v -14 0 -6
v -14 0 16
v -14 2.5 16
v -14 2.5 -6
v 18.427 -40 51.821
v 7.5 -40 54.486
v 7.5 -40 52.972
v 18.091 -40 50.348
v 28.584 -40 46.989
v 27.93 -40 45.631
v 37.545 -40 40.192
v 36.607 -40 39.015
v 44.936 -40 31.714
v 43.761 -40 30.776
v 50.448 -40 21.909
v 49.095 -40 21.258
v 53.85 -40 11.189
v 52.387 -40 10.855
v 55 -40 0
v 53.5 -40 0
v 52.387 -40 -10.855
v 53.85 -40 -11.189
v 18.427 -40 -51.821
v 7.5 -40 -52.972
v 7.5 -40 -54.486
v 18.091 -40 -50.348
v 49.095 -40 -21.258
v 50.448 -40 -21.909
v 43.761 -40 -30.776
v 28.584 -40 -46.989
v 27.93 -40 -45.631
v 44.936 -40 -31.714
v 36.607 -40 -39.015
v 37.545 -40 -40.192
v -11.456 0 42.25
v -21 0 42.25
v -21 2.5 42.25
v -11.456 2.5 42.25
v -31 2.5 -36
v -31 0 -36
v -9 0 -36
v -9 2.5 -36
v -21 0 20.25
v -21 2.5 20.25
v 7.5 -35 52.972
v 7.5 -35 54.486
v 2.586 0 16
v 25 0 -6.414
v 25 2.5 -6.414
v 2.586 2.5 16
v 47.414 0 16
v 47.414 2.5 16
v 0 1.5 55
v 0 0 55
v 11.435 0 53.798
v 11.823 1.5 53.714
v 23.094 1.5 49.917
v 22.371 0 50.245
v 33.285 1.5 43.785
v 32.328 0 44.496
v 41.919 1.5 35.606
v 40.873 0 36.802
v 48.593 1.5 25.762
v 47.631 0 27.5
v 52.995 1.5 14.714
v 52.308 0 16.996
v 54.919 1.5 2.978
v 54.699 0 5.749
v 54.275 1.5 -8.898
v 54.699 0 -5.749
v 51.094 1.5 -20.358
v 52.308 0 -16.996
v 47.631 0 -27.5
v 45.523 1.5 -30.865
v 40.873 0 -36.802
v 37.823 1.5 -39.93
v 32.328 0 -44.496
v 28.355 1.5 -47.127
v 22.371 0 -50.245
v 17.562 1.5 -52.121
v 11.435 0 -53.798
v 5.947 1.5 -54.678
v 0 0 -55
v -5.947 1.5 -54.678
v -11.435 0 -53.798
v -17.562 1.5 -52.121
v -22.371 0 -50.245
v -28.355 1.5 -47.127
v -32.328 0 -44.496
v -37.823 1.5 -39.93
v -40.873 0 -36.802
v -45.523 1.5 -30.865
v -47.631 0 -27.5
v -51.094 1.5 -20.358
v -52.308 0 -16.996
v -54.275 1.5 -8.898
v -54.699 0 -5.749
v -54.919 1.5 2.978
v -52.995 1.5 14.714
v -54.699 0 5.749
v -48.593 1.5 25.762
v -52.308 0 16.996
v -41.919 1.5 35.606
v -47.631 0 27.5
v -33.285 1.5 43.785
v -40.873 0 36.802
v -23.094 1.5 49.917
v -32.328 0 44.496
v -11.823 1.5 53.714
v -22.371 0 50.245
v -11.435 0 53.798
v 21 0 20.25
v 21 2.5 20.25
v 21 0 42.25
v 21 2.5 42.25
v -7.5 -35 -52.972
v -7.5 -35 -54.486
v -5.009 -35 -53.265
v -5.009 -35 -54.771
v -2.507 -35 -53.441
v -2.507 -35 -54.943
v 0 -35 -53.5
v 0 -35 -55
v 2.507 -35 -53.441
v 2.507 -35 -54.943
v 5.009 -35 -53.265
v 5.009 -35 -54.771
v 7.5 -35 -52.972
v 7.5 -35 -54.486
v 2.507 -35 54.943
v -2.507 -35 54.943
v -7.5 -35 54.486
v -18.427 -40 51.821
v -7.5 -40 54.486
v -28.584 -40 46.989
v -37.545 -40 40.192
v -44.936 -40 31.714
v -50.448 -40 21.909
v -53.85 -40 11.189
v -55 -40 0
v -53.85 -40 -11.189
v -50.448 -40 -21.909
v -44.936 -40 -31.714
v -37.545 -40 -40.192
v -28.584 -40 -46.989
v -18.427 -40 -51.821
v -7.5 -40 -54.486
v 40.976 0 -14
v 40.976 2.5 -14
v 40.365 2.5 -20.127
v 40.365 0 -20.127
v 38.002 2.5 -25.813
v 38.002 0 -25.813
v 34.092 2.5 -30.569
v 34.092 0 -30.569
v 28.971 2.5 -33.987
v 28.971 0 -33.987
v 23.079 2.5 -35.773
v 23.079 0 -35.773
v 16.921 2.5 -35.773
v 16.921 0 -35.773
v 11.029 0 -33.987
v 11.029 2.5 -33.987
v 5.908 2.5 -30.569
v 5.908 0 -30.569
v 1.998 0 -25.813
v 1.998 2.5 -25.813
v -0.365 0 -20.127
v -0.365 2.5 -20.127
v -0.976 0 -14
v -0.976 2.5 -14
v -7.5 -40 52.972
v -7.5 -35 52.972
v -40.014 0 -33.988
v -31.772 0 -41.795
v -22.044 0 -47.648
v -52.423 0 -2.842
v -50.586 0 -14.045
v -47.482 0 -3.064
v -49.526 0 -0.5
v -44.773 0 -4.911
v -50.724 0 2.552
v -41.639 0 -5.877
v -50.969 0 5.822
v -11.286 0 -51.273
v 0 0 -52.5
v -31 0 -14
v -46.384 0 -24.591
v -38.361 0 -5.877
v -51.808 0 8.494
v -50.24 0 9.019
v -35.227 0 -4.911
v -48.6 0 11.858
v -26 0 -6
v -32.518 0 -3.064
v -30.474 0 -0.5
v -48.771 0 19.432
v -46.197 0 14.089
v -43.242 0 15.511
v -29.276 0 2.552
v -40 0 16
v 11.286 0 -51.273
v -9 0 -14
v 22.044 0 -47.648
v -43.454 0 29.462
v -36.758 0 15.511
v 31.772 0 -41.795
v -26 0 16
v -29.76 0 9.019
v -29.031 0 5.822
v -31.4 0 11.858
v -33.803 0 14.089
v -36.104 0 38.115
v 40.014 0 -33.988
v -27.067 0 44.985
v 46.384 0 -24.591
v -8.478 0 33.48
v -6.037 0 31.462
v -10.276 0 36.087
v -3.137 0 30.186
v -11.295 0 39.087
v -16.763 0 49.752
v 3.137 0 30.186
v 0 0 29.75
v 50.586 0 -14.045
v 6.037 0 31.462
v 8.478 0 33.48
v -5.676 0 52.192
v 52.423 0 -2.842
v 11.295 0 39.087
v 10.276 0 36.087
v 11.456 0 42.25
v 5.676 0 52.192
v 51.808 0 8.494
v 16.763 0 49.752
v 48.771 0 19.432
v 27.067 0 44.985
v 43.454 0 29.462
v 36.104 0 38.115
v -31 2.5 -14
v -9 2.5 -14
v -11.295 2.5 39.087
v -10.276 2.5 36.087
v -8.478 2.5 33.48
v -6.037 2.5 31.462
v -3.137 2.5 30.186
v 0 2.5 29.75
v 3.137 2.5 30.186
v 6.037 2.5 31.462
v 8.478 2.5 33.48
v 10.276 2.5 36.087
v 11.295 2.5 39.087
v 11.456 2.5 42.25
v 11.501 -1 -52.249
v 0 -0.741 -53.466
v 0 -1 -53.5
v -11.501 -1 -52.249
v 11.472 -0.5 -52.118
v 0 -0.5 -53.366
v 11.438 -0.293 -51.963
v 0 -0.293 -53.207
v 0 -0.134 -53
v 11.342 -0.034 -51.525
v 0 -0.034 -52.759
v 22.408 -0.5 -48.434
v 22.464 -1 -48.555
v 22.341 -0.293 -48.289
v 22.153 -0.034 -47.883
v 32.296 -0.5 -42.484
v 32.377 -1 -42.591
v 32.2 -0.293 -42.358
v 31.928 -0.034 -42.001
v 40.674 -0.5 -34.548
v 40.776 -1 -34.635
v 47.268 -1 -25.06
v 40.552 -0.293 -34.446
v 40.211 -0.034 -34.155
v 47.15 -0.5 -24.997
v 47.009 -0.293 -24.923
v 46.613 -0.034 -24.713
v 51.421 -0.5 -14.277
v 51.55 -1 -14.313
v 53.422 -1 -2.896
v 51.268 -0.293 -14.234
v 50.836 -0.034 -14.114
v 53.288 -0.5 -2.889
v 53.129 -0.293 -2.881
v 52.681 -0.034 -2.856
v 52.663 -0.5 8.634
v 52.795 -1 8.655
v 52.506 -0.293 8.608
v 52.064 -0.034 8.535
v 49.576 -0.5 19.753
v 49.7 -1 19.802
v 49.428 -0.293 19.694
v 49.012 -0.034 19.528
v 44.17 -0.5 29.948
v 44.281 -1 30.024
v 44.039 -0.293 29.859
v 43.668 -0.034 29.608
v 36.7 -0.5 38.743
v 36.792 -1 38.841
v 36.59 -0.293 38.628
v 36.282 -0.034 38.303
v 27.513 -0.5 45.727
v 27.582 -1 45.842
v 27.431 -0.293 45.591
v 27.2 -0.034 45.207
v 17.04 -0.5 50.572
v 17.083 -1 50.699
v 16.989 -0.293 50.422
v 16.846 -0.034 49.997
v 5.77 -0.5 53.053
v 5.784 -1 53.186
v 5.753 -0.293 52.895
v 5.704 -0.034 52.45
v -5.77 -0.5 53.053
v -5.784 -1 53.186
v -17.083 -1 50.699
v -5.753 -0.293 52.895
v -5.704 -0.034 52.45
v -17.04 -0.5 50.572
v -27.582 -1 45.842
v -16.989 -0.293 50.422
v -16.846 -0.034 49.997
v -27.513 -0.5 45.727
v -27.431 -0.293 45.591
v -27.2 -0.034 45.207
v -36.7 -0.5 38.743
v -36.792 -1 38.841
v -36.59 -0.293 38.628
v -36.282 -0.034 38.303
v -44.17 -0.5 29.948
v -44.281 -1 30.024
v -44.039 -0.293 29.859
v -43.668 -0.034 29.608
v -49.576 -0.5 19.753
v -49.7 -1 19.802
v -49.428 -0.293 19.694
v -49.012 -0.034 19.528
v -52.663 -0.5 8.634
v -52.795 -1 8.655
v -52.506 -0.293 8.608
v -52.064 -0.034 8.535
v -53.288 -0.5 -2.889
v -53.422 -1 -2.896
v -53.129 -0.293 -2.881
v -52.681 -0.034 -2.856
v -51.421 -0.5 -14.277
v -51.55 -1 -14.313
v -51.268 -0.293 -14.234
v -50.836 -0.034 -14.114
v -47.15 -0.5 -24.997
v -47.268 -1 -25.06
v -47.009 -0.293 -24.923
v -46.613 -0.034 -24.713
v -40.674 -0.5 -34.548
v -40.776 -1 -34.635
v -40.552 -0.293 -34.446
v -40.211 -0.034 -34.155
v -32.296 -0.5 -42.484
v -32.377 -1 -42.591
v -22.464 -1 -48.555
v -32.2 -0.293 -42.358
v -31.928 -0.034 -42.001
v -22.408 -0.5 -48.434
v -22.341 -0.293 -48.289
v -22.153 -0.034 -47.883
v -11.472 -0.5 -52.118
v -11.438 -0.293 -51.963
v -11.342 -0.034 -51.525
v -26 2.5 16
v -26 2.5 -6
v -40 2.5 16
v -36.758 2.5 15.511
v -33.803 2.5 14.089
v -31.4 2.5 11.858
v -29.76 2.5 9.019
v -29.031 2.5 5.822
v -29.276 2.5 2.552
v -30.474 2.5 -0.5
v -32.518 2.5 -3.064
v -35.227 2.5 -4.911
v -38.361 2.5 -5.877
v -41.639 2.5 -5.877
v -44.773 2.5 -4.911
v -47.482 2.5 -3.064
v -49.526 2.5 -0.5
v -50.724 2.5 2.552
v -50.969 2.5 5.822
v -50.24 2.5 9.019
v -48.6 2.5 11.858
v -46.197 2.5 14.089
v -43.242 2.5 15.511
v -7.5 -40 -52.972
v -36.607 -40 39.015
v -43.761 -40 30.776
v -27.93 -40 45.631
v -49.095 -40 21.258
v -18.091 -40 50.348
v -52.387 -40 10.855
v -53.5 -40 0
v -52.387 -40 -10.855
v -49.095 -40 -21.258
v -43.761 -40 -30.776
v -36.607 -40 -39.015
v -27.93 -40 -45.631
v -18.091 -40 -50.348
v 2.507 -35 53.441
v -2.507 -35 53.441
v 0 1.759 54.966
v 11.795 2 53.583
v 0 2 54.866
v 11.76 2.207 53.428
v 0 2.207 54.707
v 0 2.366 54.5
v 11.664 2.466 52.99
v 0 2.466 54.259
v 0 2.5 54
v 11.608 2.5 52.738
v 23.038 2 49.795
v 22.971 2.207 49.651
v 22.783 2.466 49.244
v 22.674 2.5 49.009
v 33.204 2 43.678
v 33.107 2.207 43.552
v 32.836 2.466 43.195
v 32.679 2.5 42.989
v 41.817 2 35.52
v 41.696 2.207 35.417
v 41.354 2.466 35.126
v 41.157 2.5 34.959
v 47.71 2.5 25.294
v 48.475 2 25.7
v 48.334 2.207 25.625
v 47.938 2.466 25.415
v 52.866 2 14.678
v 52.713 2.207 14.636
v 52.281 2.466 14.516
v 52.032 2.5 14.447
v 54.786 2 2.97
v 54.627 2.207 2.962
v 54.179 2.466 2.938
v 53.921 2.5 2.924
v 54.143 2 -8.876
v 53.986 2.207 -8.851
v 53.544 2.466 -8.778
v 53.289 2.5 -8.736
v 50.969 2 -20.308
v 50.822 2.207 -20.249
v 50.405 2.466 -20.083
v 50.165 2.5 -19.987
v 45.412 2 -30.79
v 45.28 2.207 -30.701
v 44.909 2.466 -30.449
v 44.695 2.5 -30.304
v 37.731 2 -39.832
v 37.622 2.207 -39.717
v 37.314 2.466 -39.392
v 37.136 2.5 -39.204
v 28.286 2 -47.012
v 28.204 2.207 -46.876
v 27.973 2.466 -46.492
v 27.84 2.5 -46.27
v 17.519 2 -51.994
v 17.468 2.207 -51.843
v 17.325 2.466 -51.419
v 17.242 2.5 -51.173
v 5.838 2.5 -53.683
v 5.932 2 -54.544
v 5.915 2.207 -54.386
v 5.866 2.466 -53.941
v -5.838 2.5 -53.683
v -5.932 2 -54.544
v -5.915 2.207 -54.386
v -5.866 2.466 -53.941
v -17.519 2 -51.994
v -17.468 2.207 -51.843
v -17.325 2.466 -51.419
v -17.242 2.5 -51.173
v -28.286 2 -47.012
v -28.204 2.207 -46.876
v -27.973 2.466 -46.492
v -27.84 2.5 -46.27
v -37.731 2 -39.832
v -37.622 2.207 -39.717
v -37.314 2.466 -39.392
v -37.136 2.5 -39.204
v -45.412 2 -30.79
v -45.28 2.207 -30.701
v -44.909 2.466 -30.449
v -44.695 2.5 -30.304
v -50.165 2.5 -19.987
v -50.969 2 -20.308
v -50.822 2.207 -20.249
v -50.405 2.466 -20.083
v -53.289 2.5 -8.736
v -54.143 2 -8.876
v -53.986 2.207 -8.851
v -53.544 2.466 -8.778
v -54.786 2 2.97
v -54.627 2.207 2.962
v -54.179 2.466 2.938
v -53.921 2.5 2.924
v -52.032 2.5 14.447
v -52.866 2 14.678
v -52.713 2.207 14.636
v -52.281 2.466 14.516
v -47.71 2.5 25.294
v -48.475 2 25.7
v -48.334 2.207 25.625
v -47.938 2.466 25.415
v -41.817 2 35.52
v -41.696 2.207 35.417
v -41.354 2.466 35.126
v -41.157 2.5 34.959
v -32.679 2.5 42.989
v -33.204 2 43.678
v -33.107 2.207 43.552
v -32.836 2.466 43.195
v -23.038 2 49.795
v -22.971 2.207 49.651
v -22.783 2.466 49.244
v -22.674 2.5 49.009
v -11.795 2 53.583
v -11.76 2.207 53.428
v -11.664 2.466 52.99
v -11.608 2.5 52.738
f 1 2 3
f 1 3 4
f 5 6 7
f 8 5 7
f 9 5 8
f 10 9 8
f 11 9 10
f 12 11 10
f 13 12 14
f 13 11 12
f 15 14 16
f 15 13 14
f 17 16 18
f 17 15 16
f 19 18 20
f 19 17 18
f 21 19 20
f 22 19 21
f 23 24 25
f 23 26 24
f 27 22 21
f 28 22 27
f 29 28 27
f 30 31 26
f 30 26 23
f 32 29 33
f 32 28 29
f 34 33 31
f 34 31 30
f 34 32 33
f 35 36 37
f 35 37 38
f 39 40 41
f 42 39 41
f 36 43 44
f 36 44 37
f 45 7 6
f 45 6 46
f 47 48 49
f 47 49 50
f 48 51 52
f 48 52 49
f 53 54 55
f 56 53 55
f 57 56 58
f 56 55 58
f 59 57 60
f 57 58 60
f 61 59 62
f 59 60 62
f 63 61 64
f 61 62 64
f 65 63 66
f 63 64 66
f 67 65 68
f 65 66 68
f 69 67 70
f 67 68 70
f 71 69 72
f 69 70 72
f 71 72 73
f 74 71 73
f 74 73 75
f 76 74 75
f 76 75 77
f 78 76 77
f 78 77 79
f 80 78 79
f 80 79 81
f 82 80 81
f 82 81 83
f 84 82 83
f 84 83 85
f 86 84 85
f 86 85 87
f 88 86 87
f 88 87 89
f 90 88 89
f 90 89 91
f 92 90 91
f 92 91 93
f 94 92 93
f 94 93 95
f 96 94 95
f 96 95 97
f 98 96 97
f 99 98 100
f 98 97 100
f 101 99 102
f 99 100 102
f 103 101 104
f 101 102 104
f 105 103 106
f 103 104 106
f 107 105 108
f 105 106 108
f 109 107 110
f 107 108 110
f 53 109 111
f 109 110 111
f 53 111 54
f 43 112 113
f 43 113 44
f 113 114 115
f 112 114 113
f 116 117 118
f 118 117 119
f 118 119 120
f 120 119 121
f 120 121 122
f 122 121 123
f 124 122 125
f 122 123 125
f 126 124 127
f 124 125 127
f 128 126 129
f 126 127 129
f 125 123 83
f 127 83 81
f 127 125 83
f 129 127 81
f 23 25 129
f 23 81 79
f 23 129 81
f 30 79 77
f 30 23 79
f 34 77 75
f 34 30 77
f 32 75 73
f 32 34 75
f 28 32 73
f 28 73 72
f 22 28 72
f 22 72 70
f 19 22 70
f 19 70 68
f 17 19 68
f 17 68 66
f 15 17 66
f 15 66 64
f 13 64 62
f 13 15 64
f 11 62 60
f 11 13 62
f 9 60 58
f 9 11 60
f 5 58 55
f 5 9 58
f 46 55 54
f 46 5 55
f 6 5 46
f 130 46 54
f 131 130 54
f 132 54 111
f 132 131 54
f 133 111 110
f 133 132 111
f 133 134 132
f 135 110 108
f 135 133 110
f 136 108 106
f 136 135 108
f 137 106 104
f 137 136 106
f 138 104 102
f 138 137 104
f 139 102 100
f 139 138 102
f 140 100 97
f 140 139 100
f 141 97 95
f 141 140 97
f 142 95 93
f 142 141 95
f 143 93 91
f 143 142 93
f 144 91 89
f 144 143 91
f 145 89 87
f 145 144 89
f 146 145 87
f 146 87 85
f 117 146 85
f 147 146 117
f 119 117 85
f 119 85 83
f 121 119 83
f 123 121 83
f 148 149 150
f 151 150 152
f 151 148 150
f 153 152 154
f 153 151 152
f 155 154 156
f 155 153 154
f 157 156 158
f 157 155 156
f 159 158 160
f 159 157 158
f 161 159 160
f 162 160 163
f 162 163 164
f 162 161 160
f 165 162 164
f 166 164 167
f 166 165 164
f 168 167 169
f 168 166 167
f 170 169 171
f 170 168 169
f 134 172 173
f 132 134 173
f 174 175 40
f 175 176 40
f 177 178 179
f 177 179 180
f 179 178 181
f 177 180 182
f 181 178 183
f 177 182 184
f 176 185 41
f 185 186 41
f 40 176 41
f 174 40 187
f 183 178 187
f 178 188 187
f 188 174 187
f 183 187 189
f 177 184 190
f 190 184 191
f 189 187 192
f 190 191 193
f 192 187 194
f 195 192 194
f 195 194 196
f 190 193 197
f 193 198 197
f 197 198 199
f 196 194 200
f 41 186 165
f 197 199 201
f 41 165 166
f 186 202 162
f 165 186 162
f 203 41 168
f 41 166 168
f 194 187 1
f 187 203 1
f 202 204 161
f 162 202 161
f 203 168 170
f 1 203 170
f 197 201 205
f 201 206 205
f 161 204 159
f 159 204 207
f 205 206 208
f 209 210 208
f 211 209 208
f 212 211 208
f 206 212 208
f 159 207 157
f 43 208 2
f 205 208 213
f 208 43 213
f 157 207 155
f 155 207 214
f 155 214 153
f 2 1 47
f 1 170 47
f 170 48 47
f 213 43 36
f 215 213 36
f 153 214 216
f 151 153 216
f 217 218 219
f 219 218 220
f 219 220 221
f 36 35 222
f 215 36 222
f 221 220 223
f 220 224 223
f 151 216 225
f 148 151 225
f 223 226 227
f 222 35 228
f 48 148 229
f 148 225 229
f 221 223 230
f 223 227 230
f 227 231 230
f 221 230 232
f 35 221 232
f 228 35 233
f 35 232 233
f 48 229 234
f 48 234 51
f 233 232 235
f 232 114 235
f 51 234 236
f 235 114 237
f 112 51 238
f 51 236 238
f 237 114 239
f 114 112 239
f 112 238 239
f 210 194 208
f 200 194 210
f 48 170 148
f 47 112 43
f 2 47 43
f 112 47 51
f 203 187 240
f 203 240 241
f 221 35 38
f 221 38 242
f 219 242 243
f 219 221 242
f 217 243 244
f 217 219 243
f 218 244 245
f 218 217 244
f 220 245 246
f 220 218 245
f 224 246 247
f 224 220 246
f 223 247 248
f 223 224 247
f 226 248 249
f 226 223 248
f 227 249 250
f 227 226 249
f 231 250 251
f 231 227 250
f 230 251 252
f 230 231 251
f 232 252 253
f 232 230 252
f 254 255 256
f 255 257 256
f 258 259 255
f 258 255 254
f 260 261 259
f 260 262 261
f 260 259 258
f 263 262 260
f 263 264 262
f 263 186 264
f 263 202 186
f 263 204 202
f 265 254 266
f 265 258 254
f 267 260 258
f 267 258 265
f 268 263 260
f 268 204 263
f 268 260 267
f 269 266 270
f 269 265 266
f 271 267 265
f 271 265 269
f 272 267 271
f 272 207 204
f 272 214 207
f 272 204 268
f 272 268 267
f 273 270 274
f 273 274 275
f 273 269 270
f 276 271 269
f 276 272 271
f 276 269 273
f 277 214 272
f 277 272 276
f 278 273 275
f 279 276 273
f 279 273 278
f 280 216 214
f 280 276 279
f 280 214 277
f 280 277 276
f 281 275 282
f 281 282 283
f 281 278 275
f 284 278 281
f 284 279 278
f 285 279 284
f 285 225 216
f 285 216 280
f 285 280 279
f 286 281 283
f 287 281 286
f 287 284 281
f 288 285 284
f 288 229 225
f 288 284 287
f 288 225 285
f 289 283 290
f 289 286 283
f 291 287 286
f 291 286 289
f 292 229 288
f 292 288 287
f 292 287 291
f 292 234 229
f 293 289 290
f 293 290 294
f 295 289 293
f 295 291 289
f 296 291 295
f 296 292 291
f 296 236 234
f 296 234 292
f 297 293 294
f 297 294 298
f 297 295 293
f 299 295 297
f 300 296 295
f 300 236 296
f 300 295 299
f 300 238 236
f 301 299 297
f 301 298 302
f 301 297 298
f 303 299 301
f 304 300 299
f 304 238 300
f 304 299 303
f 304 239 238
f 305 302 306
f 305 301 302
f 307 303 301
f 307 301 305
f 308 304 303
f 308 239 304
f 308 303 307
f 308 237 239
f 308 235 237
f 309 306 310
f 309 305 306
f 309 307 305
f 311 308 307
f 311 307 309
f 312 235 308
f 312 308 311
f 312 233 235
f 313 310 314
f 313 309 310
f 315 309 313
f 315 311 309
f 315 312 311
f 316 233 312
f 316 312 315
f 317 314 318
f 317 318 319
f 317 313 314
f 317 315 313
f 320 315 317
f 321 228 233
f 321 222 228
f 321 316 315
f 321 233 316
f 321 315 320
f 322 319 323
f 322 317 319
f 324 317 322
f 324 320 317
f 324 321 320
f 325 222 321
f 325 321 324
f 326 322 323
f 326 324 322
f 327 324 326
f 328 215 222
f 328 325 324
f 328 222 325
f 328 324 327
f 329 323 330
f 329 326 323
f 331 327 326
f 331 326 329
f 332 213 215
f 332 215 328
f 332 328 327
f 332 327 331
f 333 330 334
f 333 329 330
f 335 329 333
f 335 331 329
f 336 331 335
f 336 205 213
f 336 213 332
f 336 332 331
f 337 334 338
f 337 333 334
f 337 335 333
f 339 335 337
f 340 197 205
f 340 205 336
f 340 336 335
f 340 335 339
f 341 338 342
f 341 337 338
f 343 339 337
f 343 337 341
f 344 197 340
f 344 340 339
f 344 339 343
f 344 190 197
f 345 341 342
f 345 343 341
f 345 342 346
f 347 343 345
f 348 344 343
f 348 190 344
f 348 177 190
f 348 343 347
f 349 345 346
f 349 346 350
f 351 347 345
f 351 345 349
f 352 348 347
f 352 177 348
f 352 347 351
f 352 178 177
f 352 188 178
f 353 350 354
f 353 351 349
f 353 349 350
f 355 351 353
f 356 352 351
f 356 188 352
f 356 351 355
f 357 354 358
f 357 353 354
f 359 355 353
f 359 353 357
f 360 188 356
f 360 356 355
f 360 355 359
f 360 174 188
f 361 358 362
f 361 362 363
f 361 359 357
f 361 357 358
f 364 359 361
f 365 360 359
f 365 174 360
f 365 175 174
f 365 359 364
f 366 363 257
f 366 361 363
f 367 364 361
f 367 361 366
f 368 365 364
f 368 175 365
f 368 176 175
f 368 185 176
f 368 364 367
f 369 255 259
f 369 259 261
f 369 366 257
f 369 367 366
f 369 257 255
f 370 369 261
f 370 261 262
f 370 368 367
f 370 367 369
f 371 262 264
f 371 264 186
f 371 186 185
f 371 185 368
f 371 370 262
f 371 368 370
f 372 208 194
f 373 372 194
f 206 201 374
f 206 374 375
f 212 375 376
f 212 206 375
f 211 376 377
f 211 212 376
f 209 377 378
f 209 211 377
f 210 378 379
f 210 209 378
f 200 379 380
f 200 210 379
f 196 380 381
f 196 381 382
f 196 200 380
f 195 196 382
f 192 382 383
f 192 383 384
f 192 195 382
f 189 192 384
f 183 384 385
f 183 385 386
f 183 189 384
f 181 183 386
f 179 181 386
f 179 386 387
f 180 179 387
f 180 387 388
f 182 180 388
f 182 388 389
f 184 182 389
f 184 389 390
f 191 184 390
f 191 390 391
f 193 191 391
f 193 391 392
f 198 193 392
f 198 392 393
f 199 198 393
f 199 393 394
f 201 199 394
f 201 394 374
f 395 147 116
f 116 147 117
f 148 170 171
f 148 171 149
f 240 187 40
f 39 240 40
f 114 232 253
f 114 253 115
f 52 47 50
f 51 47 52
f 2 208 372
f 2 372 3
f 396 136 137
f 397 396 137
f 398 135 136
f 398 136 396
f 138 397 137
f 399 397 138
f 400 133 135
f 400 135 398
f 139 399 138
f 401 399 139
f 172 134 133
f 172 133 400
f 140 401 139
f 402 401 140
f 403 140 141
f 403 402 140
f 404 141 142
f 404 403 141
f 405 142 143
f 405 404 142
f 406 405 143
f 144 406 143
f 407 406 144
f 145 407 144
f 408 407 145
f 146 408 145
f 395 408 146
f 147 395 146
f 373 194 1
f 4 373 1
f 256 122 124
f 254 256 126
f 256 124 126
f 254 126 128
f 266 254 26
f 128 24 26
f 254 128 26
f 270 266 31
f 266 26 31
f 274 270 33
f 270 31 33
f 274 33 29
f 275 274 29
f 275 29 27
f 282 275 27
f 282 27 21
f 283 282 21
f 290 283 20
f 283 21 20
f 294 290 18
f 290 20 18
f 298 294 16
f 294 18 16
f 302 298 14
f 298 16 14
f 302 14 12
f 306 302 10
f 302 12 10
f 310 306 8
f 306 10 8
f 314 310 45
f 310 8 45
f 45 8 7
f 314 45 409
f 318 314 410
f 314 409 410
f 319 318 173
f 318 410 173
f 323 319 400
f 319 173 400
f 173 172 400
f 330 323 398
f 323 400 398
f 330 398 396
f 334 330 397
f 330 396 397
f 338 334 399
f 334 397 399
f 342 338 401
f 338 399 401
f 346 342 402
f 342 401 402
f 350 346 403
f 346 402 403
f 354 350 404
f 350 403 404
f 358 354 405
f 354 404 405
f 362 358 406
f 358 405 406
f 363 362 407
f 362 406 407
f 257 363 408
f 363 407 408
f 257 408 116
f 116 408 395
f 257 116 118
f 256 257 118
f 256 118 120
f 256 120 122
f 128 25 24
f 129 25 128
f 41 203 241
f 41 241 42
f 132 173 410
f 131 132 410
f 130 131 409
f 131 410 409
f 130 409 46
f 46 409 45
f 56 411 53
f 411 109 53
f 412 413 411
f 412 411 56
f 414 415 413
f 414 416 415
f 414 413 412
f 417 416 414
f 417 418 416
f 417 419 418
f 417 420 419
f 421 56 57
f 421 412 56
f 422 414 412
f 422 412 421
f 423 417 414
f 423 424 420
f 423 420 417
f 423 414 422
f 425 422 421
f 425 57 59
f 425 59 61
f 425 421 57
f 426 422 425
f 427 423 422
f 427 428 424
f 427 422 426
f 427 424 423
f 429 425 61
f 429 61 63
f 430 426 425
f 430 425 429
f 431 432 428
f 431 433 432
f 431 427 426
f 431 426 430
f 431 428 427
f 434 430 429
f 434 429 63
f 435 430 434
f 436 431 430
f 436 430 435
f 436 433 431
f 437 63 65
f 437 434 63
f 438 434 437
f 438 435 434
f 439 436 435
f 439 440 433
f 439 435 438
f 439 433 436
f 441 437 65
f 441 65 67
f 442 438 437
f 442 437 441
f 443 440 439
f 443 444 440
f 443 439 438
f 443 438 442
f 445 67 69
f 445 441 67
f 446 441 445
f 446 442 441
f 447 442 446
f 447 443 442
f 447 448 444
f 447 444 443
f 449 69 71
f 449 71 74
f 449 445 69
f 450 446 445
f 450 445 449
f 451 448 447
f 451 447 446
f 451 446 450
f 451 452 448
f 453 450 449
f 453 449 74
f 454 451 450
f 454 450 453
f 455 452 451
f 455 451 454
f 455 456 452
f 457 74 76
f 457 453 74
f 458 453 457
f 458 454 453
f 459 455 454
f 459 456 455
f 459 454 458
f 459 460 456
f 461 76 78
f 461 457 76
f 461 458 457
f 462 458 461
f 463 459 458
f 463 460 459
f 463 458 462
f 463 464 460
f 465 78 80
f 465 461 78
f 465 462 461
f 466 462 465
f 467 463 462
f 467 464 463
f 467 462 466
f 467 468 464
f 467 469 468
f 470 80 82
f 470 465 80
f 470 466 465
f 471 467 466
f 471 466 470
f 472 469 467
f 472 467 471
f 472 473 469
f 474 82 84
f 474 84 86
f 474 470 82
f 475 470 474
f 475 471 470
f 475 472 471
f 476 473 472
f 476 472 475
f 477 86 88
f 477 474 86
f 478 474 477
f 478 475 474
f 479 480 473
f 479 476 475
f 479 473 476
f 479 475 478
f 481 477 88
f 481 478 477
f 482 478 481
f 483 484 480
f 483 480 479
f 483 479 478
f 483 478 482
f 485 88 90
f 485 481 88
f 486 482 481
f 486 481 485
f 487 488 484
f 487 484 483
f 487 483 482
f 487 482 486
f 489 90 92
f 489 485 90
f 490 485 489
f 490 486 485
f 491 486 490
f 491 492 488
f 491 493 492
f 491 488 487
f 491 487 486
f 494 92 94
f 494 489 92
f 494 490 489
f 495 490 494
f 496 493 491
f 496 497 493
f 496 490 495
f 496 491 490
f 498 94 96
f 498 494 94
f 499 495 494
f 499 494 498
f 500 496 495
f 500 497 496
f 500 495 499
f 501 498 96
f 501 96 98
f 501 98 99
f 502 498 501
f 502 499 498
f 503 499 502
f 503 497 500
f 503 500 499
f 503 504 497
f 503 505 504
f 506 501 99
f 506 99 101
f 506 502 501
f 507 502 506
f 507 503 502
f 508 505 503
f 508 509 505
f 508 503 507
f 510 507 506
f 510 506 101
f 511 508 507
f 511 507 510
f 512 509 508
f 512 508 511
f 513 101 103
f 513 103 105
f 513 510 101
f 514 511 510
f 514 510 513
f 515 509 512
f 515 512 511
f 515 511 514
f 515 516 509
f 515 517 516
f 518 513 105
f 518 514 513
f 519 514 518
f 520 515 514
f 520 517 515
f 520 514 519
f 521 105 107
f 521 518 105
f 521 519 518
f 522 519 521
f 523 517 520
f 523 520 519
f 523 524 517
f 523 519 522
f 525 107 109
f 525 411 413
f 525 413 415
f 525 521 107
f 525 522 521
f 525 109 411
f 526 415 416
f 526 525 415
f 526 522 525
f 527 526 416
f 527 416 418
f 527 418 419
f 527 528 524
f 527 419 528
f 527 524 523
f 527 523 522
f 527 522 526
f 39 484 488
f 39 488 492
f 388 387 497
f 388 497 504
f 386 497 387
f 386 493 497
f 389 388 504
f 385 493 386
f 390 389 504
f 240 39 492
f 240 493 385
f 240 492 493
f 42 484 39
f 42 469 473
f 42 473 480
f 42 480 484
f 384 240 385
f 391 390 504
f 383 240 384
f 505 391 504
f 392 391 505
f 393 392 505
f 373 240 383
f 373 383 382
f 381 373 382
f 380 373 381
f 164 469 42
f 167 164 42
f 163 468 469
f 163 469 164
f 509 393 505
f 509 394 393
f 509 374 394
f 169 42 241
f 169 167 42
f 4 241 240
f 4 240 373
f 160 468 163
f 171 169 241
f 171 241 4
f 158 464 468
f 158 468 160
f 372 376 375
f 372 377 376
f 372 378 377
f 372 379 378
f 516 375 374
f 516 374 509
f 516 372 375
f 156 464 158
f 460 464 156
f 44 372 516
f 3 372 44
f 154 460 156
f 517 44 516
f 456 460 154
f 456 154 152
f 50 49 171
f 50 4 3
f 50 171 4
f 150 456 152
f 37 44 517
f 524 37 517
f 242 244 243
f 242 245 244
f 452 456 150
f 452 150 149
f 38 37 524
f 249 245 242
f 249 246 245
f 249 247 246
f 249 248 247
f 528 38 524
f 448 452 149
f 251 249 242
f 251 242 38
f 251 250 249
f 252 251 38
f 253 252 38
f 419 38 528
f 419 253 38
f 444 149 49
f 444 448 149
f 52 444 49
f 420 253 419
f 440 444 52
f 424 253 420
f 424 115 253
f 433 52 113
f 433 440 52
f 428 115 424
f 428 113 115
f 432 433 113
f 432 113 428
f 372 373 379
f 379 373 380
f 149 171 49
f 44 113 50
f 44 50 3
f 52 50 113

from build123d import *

# Parameters (mm, degrees)
SKETCH1_R               = 55
SKETCH1_R_2             = 10
SKETCH1_W               = 20
SKETCH1_H               = 20
SKETCH1_W_2             = 10
SKETCH1_W_3             = 40
BOSS_EXTRUDE1_DEPTH     = 2.5
BOSS_EXTRUDE2_START     = 40
SKETCH2_R               = 55
SKETCH2_R_2             = 53.5
BOSS_EXTRUDE2_DEPTH     = 40
CUT_EXTRUDE1_START      = -5
SKETCH3_W               = 22
SKETCH3_H               = 22
SKETCH3_W_2             = 20
SKETCH3_H_2             = 20
SKETCH3_W_3             = 12
SKETCH3_W_4             = 10
SKETCH3_R               = 11
SKETCH3_R_2             = 10
CUT_EXTRUDE1_DEPTH      = 5
FILLET1_R               = 1
FILLET2_R               = 1
CUT_EXTRUDE2_DEPTH      = 88.464278486
CUT_EXTRUDE2_DEPTH_BACK = 88.464278486
SKETCH4_W               = 15
SKETCH4_H               = 5


with BuildPart() as part:
    # Sketch1 → Boss-Extrude1 (new body)
    # profile 1 of 2: a face of its own
    with BuildSketch(Plane(origin=(0, 0, 0), x_dir=(1, 0, 0), z_dir=(0, 1, 0))):
        with Locations(Location((0, 0, 0), (0, 0, 270))):
            Circle(SKETCH1_R)
        with Locations(Location((-40, -5, 0), (0, 0, 270))):
            Circle(SKETCH1_R_2, mode=Mode.SUBTRACT)
        with Locations((-20, 25)):
            Rectangle(SKETCH1_W, SKETCH1_H, mode=Mode.SUBTRACT)
        with Locations((-20, -5)):
            Rectangle(SKETCH1_W_2, SKETCH1_H, mode=Mode.SUBTRACT)
        Polygon((5, -15), (25, 5), (45, -15), align=None, mode=Mode.SUBTRACT)
        with Locations((0, -31.25)):
            Rectangle(SKETCH1_W_3, SKETCH1_H, mode=Mode.SUBTRACT)
        with BuildLine():
            Line((0, 15), (40, 15))
            ThreePointArc((40, 15), (20, 35), (0, 15))
        make_face(mode=Mode.SUBTRACT)
    # profile 2 of 2: a face of its own
    with BuildSketch(Plane(origin=(0, 0, 0), x_dir=(1, 0, 0), z_dir=(0, 1, 0))):
        with BuildLine():
            ThreePointArc((12.5, -41.25), (0, -28.75), (-12.5, -41.25))
            Line((-12.5, -41.25), (12.5, -41.25))
        make_face()
    extrude(amount=BOSS_EXTRUDE1_DEPTH)

    # Sketch2 → Boss-Extrude2 (add)
    with BuildSketch(Plane.XZ.offset(BOSS_EXTRUDE2_START)):
        with Locations(Location((0, 0, 0), (0, 0, 270))):
            Circle(SKETCH2_R)
        with Locations(Location((0, 0, 0), (0, 0, 270))):
            Circle(SKETCH2_R_2, mode=Mode.SUBTRACT)
    extrude(amount=-BOSS_EXTRUDE2_DEPTH)

    # Sketch3 → Cut-Extrude1 (cut)
    # profile 1 of 6: a face of its own
    with BuildSketch(Plane(origin=(0, 2.5, 0), x_dir=(1, 0, 0), z_dir=(0, 1, 0)).offset(CUT_EXTRUDE1_START)):
        with Locations((-20, 25)):
            Rectangle(SKETCH3_W, SKETCH3_H)
        with Locations((-20, 25)):
            Rectangle(SKETCH3_W_2, SKETCH3_H_2, mode=Mode.SUBTRACT)
    # profile 2 of 6: a face of its own
    with BuildSketch(Plane(origin=(0, 2.5, 0), x_dir=(1, 0, 0), z_dir=(0, 1, 0)).offset(CUT_EXTRUDE1_START)):
        with BuildLine():
            ThreePointArc((40.976176963, 14), (20, 36), (-0.976176963, 14))
            Line((-0.976176963, 14), (40.976176963, 14))
        make_face()
        with BuildLine():
            Line((40, 15), (0, 15))
            ThreePointArc((0, 15), (20, 35), (40, 15))
        make_face(mode=Mode.SUBTRACT)
    # profile 3 of 6: a face of its own
    with BuildSketch(Plane(origin=(0, 2.5, 0), x_dir=(1, 0, 0), z_dir=(0, 1, 0)).offset(CUT_EXTRUDE1_START)):
        with Locations((-20, -5)):
            Rectangle(SKETCH3_W_3, SKETCH3_H)
        with Locations((-20, -5)):
            Rectangle(SKETCH3_W_4, SKETCH3_H_2, mode=Mode.SUBTRACT)
    # profile 4 of 6: a face of its own
    with BuildSketch(Plane(origin=(0, 2.5, 0), x_dir=(1, 0, 0), z_dir=(0, 1, 0)).offset(CUT_EXTRUDE1_START)):
        Polygon((47.414213562, -16), (25, 6.414213562), (2.585786438, -16), align=None)
        Polygon((5, -15), (25, 5), (45, -15), align=None, mode=Mode.SUBTRACT)
    # profile 5 of 6: a face of its own
    with BuildSketch(Plane(origin=(0, 2.5, 0), x_dir=(1, 0, 0), z_dir=(0, 1, 0)).offset(CUT_EXTRUDE1_START)):
        with BuildLine():
            Line((21, -42.25), (21, -20.25))
            Line((21, -20.25), (-21, -20.25))
            Line((-21, -20.25), (-21, -42.25))
            Line((-21, -42.25), (-11.456439237, -42.25))
            ThreePointArc((-11.456439237, -42.25), (0, -29.75), (11.456439237, -42.25))
            Line((11.456439237, -42.25), (21, -42.25))
        make_face()
        with BuildLine():
            Line((-20, -21.25), (20, -21.25))
            Line((20, -21.25), (20, -41.25))
            Line((20, -41.25), (12.5, -41.25))
            ThreePointArc((12.5, -41.25), (0, -28.75), (-12.5, -41.25))
            Line((-12.5, -41.25), (-20, -41.25))
            Line((-20, -41.25), (-20, -21.25))
        make_face(mode=Mode.SUBTRACT)
    # profile 6 of 6: a face of its own
    with BuildSketch(Plane(origin=(0, 2.5, 0), x_dir=(1, 0, 0), z_dir=(0, 1, 0)).offset(CUT_EXTRUDE1_START)):
        with Locations(Location((-40, -5, 0), (0, 0, 270))):
            Circle(SKETCH3_R)
        with Locations((-40, -5)):
            Circle(SKETCH3_R_2, mode=Mode.SUBTRACT)
    extrude(amount=CUT_EXTRUDE1_DEPTH, mode=Mode.SUBTRACT)

    # Fillet1
    fillet1_edges = [part.edges().sort_by_distance(p)[0] for p in [
        (0, 2.5, -55),
    ]]
    fillet(fillet1_edges, radius=FILLET1_R)

    # Fillet2
    fillet2_edges = [part.edges().sort_by_distance(p)[0] for p in [
        (0, 0, 53.5),
    ]]
    fillet(fillet2_edges, radius=FILLET2_R)

    # Sketch4 → Cut-Extrude2 (cut, two sides: drawn at the far end of the back side and taken through both)
    with BuildSketch(Plane.XY.offset(-CUT_EXTRUDE2_DEPTH_BACK)):
        with Locations((0, -37.5)):
            Rectangle(SKETCH4_W, SKETCH4_H)
    extrude(amount=CUT_EXTRUDE2_DEPTH + CUT_EXTRUDE2_DEPTH_BACK, mode=Mode.SUBTRACT)


solid = part.part
